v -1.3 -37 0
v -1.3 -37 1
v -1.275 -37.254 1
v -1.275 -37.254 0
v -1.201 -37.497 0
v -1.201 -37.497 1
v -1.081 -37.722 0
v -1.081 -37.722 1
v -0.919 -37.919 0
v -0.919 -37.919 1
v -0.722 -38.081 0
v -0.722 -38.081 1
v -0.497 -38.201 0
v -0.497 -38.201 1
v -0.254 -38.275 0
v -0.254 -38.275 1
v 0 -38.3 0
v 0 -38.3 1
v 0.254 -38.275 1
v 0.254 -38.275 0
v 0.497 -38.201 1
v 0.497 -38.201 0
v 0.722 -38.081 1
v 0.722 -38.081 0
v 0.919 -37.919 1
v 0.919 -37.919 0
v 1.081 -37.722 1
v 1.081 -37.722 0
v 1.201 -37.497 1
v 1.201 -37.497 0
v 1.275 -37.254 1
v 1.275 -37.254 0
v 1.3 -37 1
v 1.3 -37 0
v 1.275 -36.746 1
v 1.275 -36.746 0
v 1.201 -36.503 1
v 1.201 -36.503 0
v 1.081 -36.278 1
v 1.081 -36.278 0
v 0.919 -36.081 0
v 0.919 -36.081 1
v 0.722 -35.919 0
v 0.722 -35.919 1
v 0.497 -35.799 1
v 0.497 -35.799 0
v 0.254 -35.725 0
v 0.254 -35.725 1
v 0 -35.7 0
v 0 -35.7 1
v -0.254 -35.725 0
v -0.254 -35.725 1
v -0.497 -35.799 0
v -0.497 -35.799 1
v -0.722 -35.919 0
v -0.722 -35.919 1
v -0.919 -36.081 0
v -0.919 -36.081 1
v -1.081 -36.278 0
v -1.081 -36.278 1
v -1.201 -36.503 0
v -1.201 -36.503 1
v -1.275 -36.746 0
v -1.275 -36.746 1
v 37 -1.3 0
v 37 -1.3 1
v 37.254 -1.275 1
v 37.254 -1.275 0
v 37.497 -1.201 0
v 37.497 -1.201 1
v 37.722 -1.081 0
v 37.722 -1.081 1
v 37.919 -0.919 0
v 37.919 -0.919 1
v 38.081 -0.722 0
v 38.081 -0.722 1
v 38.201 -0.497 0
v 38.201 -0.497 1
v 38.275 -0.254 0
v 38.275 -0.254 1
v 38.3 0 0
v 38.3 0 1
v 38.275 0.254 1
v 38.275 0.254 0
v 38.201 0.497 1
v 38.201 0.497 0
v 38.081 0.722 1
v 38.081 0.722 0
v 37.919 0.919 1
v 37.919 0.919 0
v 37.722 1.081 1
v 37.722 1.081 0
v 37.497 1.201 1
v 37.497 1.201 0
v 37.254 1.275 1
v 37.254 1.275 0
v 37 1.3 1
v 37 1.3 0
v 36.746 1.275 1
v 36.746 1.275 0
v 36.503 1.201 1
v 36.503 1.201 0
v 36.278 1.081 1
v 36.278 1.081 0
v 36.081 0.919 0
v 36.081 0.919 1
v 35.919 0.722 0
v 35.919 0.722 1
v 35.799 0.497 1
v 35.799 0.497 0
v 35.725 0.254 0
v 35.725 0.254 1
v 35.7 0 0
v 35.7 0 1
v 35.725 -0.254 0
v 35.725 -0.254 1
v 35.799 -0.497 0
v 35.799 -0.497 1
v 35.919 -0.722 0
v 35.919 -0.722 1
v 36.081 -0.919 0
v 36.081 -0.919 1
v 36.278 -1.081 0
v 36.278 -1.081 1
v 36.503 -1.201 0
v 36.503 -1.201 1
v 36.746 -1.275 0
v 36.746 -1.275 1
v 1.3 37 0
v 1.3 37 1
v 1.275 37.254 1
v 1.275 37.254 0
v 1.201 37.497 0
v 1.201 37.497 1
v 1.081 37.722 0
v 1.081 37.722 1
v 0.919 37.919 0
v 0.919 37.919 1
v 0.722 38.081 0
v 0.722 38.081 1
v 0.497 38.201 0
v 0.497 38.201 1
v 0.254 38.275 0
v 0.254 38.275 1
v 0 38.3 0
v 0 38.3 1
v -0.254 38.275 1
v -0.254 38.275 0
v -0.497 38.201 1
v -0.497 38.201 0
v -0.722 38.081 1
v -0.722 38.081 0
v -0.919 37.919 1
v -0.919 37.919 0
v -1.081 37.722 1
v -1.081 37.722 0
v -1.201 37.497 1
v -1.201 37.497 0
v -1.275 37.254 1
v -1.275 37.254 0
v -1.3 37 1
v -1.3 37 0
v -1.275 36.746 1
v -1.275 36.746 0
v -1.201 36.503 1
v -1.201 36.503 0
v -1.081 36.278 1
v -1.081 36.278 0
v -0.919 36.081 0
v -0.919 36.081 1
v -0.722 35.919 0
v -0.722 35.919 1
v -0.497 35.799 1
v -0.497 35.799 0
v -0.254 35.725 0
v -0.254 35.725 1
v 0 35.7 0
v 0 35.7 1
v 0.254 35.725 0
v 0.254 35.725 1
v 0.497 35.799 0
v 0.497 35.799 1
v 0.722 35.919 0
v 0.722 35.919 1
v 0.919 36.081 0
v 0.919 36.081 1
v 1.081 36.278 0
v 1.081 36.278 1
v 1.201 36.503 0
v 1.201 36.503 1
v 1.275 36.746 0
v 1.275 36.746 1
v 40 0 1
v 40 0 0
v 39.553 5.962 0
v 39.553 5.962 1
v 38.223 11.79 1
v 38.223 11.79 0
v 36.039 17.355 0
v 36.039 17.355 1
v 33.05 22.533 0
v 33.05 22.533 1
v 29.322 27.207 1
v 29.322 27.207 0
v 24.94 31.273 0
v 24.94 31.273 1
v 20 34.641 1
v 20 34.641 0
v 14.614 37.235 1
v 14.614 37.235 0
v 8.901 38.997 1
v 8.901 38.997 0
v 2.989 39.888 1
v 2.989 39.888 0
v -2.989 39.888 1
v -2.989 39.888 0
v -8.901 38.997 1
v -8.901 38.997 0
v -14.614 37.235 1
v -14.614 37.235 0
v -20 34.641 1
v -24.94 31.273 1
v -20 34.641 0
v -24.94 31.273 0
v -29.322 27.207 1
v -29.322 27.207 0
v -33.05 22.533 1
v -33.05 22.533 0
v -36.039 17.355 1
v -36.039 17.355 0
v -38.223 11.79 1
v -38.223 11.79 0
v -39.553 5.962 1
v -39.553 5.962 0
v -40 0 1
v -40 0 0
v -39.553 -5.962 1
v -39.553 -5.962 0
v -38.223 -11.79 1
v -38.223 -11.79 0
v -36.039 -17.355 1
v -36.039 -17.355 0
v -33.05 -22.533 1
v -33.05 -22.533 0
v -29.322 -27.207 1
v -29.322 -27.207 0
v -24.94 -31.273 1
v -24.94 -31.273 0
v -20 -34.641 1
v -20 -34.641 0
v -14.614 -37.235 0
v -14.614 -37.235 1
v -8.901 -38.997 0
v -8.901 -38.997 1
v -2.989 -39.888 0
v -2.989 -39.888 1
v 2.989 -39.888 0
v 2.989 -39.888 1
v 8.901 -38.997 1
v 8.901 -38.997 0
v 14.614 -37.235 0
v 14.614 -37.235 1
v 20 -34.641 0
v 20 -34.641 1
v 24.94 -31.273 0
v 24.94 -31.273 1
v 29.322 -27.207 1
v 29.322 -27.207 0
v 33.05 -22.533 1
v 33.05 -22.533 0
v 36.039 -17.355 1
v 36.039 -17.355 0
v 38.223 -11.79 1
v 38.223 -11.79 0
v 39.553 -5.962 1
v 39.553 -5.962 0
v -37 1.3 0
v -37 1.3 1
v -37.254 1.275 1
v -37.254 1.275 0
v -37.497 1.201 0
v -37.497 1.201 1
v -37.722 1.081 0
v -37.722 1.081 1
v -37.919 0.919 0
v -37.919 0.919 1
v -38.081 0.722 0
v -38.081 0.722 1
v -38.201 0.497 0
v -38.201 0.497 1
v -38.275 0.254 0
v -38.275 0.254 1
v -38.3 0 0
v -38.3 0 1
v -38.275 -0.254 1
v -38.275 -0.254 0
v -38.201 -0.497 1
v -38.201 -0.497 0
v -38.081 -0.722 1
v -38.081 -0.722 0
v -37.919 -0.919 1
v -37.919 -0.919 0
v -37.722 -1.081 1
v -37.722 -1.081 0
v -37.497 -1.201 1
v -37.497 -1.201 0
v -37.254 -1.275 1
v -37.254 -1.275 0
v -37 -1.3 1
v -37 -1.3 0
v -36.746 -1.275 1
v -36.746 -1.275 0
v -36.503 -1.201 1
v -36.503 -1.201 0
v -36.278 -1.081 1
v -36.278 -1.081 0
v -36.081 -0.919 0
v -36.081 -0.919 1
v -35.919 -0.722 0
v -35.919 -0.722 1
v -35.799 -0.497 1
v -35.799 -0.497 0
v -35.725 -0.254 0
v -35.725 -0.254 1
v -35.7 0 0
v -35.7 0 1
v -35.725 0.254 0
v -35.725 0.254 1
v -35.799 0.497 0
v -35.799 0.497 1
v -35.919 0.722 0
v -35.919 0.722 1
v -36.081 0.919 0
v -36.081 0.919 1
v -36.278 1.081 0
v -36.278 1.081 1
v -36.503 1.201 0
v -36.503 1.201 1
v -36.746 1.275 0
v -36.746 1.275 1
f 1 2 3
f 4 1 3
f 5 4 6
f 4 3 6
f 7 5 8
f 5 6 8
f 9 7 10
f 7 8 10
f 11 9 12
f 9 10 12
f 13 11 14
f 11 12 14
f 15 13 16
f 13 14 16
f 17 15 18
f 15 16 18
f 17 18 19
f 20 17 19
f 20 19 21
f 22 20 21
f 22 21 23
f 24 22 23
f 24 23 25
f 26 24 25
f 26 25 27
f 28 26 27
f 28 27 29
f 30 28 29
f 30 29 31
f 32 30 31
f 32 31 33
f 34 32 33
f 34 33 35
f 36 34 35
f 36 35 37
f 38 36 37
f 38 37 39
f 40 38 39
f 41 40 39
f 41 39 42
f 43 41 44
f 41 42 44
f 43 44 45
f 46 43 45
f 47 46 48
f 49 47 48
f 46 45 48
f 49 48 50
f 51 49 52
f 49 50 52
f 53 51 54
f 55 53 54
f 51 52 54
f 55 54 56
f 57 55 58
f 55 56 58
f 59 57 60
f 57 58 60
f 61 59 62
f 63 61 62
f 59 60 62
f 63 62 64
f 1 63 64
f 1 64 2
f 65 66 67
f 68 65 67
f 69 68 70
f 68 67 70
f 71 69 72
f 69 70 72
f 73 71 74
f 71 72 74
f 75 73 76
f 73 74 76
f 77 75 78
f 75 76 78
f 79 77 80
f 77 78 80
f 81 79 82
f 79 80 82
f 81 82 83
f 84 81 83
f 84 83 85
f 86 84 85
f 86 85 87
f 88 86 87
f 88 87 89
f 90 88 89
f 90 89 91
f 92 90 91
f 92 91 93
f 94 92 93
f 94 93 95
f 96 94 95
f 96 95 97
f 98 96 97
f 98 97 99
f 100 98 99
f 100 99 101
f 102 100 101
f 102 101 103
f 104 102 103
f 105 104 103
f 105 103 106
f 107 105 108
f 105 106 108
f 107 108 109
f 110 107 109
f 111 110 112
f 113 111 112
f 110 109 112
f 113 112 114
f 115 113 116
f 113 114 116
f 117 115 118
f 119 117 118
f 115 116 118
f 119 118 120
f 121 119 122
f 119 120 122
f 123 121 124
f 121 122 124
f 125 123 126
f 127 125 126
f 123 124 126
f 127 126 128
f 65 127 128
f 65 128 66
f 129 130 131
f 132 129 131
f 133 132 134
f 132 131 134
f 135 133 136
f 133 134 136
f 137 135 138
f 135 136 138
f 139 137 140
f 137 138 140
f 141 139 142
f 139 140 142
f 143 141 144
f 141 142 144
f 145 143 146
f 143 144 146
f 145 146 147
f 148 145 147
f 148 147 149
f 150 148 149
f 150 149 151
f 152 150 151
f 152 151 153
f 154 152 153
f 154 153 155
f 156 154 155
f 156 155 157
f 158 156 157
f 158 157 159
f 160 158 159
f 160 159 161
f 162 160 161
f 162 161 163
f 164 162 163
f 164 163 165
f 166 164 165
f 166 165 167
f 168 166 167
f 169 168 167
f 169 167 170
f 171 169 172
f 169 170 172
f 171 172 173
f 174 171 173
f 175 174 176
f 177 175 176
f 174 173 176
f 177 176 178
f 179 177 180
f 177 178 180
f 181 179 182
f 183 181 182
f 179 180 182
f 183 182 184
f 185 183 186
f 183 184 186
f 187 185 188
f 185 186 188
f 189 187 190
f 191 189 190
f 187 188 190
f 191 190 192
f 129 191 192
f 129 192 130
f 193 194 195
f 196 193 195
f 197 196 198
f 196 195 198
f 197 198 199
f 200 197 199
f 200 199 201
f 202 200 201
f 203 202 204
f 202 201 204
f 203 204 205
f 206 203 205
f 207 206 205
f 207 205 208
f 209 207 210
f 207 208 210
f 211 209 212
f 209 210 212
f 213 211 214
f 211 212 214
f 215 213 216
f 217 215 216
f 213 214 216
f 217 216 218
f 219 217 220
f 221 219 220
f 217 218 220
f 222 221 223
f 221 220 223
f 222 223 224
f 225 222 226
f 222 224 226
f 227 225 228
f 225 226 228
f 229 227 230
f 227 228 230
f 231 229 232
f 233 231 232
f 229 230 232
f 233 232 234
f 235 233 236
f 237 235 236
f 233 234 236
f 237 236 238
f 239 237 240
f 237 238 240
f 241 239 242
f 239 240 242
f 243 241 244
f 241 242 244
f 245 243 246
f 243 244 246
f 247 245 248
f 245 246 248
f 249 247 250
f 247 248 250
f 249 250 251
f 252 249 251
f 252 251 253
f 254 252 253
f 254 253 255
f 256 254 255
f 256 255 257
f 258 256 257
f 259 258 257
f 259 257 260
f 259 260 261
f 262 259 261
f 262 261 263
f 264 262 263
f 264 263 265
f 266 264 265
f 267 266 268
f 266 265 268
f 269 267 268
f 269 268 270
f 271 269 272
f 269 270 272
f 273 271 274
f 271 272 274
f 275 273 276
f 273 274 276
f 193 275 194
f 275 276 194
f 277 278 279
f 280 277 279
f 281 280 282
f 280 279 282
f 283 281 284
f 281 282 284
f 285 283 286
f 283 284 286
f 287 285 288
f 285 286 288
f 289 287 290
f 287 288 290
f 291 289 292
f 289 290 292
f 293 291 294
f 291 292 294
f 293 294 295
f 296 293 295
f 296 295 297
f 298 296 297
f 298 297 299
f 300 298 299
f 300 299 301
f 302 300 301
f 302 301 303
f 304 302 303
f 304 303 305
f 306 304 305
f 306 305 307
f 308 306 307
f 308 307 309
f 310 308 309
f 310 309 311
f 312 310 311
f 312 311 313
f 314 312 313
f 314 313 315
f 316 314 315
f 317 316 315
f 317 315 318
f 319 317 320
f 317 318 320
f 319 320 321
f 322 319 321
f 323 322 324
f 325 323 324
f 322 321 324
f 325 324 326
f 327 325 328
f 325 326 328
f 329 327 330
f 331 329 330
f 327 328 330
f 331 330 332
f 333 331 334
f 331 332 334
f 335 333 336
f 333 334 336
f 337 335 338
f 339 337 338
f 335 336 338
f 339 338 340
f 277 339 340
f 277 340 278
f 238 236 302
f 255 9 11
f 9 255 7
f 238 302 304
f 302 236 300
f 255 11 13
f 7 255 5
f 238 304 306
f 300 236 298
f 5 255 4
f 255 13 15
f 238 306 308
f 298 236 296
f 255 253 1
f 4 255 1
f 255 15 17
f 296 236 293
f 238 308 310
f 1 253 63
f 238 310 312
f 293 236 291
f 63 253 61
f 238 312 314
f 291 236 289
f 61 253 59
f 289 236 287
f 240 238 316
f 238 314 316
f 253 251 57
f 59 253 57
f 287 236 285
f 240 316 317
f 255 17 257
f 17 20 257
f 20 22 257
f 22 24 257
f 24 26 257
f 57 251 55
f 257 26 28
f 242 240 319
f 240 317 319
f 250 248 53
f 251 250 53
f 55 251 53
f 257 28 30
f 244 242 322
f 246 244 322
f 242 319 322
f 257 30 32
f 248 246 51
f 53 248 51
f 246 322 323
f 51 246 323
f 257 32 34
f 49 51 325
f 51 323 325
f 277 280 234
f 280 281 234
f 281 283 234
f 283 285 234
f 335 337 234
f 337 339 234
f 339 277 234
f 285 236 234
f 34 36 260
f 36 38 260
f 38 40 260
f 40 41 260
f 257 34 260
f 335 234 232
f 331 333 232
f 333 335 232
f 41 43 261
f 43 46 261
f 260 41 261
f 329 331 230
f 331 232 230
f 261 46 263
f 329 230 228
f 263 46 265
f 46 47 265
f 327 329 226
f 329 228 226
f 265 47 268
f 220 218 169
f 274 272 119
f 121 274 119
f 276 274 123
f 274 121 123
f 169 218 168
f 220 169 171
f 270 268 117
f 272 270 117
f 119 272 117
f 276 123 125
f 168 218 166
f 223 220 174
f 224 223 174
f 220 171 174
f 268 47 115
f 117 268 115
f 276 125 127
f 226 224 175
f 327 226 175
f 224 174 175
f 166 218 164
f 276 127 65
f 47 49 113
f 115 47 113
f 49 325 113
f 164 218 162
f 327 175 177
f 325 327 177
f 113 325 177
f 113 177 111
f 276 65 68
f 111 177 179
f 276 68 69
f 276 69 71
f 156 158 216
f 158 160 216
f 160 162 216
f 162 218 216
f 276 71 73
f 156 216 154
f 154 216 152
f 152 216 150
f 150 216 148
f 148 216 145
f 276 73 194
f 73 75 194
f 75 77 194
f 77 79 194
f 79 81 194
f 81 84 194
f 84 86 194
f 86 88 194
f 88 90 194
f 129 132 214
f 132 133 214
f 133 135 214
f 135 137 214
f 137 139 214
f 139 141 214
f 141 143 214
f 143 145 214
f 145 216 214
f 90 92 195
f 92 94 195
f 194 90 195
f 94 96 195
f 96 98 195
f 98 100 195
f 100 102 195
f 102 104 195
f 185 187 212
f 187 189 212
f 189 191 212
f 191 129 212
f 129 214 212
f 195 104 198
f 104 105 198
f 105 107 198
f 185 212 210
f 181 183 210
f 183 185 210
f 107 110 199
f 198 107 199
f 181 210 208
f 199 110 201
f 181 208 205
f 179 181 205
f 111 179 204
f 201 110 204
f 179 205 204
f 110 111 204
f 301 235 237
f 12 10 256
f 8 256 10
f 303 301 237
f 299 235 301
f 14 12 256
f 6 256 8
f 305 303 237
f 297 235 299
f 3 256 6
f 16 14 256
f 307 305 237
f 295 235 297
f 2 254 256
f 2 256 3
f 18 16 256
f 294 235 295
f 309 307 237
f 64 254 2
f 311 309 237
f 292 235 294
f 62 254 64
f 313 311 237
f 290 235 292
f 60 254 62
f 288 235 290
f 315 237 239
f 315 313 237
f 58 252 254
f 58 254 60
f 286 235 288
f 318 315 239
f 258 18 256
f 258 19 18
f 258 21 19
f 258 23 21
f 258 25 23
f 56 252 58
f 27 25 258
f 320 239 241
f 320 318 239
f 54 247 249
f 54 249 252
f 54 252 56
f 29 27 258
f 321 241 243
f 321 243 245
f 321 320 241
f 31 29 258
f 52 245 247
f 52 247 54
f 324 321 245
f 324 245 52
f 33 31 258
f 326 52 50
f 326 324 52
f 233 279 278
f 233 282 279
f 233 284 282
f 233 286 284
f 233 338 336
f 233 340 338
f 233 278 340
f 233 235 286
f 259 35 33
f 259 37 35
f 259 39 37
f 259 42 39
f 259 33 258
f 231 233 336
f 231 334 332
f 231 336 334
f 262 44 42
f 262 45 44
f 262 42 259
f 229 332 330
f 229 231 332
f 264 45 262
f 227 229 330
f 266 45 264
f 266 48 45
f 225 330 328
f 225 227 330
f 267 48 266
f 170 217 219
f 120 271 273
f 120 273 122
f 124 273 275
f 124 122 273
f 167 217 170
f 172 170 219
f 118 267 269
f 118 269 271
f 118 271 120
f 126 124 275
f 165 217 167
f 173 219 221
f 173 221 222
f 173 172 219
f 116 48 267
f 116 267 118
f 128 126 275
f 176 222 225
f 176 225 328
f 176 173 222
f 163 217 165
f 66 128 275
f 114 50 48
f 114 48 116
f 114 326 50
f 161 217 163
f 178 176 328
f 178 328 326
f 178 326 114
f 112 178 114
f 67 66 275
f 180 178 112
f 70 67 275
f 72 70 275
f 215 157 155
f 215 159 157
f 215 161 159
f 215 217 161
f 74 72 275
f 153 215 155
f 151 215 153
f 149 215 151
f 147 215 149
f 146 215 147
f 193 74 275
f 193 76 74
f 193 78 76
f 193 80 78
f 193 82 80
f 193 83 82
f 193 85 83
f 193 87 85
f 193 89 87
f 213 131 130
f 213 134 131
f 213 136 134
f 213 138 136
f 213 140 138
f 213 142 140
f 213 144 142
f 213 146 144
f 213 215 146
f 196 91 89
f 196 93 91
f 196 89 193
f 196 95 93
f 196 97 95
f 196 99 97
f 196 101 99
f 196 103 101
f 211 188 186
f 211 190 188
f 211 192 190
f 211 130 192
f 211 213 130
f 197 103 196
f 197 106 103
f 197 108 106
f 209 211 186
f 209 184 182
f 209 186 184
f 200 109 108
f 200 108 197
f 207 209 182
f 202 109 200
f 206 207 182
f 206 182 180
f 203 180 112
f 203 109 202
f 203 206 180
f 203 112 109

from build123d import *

# Parameters (mm, degrees)
ESQUISSE1_R                  = 40
BOSS_EXTRU_1_DEPTH           = 1
D_GAGEMENT_M21_D             = 2.6
R_P_TITION_CIRCULAIRE1_COUNT = 4


with BuildPart() as part:
    # Esquisse1 → Boss.-Extru.1 (new body)
    with BuildSketch(Plane.XY):
        Circle(ESQUISSE1_R)
    extrude(amount=BOSS_EXTRU_1_DEPTH)

    # Dégagement M21 (through all)
    with Locations(Plane(origin=(0, 0, 0), x_dir=(-1, 0, 0), z_dir=(0, 0, -1))):
        with Locations((0, 37)):
            d_gagement_m21 = Hole(D_GAGEMENT_M21_D / 2)

    # Répétition circulaire1: Dégagement M21 ×4 about axis
    r_p_tition_circulaire1_axis = Axis((0, 0, 0), (0, 0, 1))
    for i in range(1, R_P_TITION_CIRCULAIRE1_COUNT):
        add(d_gagement_m21.rotate(r_p_tition_circulaire1_axis, i * 360 / R_P_TITION_CIRCULAIRE1_COUNT), mode=Mode.SUBTRACT)


solid = part.part
